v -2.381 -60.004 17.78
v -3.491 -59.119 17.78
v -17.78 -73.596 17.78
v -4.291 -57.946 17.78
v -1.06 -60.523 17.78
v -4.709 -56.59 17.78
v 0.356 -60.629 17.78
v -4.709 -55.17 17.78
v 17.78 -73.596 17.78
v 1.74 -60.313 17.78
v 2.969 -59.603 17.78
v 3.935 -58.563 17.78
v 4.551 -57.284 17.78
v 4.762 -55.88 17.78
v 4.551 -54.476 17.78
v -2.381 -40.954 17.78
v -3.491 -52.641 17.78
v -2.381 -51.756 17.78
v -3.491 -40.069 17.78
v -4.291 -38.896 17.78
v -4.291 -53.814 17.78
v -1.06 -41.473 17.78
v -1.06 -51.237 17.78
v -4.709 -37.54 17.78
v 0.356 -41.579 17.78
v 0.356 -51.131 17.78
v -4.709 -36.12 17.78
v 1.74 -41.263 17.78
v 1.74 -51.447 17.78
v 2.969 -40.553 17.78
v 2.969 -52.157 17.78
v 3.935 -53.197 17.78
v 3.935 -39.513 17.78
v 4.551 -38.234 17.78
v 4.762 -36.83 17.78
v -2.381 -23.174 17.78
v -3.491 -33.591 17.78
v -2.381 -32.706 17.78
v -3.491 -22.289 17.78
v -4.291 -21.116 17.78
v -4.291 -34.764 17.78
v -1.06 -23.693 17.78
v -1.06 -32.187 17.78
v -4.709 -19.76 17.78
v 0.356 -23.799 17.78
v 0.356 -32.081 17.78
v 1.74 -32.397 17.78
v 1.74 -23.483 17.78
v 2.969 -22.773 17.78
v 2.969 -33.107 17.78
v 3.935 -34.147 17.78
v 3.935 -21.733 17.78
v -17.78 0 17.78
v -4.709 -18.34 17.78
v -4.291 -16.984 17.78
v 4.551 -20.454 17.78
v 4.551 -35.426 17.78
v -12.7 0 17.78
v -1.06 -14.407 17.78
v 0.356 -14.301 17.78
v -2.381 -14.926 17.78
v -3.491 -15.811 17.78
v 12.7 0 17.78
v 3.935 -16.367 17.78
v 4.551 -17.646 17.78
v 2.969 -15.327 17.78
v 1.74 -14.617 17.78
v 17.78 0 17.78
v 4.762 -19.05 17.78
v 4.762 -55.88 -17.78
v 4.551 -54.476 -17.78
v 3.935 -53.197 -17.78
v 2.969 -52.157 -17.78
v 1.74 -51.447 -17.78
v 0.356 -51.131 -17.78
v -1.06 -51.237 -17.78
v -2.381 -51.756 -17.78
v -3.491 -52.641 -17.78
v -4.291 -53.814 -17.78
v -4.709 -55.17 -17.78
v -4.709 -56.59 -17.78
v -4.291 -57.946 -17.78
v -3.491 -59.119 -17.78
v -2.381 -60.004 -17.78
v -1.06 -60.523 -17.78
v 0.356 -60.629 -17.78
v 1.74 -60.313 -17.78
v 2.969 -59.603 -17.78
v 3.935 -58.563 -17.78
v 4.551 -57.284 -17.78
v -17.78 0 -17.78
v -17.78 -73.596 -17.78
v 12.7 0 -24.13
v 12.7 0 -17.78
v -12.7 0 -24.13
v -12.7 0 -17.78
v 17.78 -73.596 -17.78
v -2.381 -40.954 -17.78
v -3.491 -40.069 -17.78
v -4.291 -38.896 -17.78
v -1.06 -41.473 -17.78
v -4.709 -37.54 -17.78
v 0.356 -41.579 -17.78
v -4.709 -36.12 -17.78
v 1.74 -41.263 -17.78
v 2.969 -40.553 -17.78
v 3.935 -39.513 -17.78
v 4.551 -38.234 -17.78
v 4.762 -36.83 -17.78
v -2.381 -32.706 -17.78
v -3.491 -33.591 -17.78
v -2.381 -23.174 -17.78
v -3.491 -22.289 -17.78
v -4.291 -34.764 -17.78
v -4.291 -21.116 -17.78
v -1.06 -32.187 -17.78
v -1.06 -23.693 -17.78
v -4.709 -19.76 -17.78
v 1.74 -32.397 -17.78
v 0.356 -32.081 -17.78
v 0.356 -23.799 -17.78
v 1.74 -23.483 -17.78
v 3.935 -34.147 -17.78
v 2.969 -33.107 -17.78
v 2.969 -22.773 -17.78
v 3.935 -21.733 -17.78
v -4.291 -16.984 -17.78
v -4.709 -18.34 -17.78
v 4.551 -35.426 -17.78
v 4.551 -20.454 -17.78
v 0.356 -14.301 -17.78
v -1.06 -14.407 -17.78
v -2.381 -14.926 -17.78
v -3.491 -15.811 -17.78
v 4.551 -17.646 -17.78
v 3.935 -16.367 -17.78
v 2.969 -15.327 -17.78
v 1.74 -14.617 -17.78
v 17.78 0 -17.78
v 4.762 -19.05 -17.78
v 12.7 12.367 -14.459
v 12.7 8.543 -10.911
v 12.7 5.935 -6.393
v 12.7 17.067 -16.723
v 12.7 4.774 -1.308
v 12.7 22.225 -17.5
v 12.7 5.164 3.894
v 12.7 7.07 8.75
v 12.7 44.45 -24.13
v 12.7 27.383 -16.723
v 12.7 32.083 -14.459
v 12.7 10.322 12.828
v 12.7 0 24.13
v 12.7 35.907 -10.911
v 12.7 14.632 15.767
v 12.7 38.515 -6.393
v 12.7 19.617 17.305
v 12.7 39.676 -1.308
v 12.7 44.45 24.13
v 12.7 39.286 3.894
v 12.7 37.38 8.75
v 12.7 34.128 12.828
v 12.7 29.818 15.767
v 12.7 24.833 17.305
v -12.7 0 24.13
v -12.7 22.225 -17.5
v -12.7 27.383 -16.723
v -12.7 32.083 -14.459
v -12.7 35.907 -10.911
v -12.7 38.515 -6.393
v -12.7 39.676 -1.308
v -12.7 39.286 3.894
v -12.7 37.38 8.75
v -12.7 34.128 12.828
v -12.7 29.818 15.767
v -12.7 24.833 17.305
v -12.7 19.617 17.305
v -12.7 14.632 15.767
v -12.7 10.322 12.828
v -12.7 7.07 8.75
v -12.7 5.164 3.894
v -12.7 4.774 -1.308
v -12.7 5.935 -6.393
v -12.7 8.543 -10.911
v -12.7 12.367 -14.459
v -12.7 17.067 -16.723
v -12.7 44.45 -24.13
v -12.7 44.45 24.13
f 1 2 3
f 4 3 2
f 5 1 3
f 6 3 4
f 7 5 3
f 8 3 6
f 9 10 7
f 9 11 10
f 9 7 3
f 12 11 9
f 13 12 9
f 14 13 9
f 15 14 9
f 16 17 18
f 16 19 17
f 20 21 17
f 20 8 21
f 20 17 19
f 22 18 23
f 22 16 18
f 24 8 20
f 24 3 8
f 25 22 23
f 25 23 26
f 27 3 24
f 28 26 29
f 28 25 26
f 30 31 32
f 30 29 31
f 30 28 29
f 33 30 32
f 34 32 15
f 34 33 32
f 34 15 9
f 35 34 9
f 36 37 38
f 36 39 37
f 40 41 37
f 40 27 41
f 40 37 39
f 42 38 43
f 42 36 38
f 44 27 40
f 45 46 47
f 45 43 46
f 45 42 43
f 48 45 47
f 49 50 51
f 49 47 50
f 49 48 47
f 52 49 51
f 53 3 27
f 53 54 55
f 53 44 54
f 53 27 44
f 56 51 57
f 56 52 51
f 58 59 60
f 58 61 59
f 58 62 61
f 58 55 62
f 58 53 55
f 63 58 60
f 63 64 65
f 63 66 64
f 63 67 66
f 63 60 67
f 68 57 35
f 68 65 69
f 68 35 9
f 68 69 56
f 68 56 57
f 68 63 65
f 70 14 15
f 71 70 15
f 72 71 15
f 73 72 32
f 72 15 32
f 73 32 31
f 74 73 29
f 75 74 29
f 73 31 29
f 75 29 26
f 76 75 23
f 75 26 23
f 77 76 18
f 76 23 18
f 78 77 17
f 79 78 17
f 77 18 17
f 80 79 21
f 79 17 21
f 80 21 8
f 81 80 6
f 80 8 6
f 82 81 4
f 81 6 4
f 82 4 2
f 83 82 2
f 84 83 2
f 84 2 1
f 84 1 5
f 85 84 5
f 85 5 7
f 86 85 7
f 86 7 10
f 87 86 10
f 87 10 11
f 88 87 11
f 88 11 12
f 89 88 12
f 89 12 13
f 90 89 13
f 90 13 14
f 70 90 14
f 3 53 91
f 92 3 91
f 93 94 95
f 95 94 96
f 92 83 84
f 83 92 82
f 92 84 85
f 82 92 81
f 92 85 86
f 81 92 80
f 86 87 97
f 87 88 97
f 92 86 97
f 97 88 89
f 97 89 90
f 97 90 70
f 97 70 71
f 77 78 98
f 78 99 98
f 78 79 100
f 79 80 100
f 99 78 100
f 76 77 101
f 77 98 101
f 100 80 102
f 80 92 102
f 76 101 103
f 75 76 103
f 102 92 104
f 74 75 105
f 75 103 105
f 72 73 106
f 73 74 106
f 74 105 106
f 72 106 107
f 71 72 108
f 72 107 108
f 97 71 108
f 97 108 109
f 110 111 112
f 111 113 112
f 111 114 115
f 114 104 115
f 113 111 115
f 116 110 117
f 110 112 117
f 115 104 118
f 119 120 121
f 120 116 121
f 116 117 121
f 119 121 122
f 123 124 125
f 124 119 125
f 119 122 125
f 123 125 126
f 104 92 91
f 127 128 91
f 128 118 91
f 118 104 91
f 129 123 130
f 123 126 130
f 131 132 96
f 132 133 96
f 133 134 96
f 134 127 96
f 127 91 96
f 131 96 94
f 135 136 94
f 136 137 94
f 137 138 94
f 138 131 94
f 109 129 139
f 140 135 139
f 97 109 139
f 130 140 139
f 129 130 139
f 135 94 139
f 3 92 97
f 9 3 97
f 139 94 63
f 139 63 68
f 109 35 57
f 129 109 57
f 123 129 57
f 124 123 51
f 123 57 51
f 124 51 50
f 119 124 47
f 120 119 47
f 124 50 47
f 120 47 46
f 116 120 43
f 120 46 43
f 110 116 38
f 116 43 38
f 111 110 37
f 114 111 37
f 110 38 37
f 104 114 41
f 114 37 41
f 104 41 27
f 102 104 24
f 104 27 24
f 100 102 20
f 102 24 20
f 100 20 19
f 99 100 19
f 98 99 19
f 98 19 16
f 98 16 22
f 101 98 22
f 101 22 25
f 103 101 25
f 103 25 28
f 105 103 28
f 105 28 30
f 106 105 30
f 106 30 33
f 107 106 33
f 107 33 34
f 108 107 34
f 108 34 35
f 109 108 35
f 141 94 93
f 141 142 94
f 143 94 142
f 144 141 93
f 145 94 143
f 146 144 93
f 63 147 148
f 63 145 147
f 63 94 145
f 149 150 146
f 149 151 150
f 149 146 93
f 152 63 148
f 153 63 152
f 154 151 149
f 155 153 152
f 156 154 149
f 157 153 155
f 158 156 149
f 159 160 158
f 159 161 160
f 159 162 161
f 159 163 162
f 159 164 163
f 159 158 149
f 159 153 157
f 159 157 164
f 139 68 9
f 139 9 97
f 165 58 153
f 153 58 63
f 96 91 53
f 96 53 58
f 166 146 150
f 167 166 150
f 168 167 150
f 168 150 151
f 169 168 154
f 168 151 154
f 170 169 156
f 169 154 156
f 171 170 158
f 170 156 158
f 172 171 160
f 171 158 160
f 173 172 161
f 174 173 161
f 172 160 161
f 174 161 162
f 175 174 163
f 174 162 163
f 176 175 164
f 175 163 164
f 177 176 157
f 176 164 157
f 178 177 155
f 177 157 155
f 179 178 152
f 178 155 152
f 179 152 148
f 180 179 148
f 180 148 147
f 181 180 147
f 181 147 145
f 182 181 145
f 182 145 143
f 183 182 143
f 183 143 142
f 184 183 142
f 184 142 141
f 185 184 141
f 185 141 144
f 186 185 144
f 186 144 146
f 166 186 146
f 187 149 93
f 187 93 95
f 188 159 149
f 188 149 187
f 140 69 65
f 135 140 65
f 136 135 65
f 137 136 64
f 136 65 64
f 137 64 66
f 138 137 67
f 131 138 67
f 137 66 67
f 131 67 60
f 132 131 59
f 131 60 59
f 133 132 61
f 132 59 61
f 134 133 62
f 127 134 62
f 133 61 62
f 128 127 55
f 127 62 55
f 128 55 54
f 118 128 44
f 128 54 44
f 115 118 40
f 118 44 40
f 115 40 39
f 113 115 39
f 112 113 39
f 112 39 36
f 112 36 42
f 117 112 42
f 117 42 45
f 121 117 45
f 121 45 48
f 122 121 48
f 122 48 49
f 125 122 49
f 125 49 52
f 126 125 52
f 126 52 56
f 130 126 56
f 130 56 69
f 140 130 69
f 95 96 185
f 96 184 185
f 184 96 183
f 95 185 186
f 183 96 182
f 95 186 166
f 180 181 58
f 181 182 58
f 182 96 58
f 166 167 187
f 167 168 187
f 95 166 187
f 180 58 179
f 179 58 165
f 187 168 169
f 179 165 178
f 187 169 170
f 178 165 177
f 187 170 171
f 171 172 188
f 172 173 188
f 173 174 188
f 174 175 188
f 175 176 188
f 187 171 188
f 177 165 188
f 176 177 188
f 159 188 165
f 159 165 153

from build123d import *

# Parameters (mm, degrees)
SKETCH1_W           = 35.56
SKETCH1_H           = 35.56
BOSS_EXTRUDE1_DEPTH = 73.5965
SKETCH2_R           = 4.7625
CUT_EXTRUDE1_DEPTH  = 84.648591215
SKETCH3_W           = 25.4
SKETCH3_H           = 35.56
BOSS_EXTRUDE2_DEPTH = 44.45
SKETCH5_W           = 25.4
SKETCH5_H           = 44.45
BOSS_EXTRUDE3_DEPTH = 6.35
SKETCH6_W           = 25.4
SKETCH6_H           = 44.45
BOSS_EXTRUDE4_DEPTH = 6.35
SKETCH4_R           = 17.500000052
CUT_EXTRUDE2_DEPTH  = 84.232998938


with BuildPart() as part:
    # Sketch1 → Boss-Extrude1 (new body)
    with BuildSketch(Plane(origin=(0, 0, 0), x_dir=(1, 0, 0), z_dir=(0, 1, 0))):
        Rectangle(SKETCH1_W, SKETCH1_H)
    extrude(amount=-BOSS_EXTRUDE1_DEPTH)

    # Sketch2 → Cut-Extrude1 (cut, through all)
    with BuildSketch(Plane.XY.offset(17.78)):
        with Locations((0, -19.05)):
            Circle(SKETCH2_R)
        with Locations((0, -36.83)):
            Circle(SKETCH2_R)
        with Locations((0, -55.88)):
            Circle(SKETCH2_R)
    extrude(amount=-CUT_EXTRUDE1_DEPTH, mode=Mode.SUBTRACT)

    # Sketch3 → Boss-Extrude2 (add)
    with BuildSketch(Plane(origin=(0, 0, 0), x_dir=(1, 0, 0), z_dir=(0, 1, 0))):
        Rectangle(SKETCH3_W, SKETCH3_H)
    extrude(amount=BOSS_EXTRUDE2_DEPTH)

    # Sketch5 → Boss-Extrude3 (add)
    with BuildSketch(Plane.XY.offset(17.78)):
        with Locations((0, 22.225)):
            Rectangle(SKETCH5_W, SKETCH5_H)
    extrude(amount=BOSS_EXTRUDE3_DEPTH)

    # Sketch6 → Boss-Extrude4 (add)
    with BuildSketch(Plane(origin=(0, 0, -17.78), x_dir=(-1, 0, 0), z_dir=(0, 0, -1))):
        with Locations((0, 22.225)):
            Rectangle(SKETCH6_W, SKETCH6_H)
    extrude(amount=BOSS_EXTRUDE4_DEPTH)

    # Sketch4 → Cut-Extrude2 (cut, through all)
    with BuildSketch(Plane(origin=(12.7, 0, 0), x_dir=(0, 0, -1), z_dir=(1, 0, 0))):
        with Locations((0, 22.225)):
            Circle(SKETCH4_R)
    extrude(amount=-CUT_EXTRUDE2_DEPTH, mode=Mode.SUBTRACT)


solid = part.part
